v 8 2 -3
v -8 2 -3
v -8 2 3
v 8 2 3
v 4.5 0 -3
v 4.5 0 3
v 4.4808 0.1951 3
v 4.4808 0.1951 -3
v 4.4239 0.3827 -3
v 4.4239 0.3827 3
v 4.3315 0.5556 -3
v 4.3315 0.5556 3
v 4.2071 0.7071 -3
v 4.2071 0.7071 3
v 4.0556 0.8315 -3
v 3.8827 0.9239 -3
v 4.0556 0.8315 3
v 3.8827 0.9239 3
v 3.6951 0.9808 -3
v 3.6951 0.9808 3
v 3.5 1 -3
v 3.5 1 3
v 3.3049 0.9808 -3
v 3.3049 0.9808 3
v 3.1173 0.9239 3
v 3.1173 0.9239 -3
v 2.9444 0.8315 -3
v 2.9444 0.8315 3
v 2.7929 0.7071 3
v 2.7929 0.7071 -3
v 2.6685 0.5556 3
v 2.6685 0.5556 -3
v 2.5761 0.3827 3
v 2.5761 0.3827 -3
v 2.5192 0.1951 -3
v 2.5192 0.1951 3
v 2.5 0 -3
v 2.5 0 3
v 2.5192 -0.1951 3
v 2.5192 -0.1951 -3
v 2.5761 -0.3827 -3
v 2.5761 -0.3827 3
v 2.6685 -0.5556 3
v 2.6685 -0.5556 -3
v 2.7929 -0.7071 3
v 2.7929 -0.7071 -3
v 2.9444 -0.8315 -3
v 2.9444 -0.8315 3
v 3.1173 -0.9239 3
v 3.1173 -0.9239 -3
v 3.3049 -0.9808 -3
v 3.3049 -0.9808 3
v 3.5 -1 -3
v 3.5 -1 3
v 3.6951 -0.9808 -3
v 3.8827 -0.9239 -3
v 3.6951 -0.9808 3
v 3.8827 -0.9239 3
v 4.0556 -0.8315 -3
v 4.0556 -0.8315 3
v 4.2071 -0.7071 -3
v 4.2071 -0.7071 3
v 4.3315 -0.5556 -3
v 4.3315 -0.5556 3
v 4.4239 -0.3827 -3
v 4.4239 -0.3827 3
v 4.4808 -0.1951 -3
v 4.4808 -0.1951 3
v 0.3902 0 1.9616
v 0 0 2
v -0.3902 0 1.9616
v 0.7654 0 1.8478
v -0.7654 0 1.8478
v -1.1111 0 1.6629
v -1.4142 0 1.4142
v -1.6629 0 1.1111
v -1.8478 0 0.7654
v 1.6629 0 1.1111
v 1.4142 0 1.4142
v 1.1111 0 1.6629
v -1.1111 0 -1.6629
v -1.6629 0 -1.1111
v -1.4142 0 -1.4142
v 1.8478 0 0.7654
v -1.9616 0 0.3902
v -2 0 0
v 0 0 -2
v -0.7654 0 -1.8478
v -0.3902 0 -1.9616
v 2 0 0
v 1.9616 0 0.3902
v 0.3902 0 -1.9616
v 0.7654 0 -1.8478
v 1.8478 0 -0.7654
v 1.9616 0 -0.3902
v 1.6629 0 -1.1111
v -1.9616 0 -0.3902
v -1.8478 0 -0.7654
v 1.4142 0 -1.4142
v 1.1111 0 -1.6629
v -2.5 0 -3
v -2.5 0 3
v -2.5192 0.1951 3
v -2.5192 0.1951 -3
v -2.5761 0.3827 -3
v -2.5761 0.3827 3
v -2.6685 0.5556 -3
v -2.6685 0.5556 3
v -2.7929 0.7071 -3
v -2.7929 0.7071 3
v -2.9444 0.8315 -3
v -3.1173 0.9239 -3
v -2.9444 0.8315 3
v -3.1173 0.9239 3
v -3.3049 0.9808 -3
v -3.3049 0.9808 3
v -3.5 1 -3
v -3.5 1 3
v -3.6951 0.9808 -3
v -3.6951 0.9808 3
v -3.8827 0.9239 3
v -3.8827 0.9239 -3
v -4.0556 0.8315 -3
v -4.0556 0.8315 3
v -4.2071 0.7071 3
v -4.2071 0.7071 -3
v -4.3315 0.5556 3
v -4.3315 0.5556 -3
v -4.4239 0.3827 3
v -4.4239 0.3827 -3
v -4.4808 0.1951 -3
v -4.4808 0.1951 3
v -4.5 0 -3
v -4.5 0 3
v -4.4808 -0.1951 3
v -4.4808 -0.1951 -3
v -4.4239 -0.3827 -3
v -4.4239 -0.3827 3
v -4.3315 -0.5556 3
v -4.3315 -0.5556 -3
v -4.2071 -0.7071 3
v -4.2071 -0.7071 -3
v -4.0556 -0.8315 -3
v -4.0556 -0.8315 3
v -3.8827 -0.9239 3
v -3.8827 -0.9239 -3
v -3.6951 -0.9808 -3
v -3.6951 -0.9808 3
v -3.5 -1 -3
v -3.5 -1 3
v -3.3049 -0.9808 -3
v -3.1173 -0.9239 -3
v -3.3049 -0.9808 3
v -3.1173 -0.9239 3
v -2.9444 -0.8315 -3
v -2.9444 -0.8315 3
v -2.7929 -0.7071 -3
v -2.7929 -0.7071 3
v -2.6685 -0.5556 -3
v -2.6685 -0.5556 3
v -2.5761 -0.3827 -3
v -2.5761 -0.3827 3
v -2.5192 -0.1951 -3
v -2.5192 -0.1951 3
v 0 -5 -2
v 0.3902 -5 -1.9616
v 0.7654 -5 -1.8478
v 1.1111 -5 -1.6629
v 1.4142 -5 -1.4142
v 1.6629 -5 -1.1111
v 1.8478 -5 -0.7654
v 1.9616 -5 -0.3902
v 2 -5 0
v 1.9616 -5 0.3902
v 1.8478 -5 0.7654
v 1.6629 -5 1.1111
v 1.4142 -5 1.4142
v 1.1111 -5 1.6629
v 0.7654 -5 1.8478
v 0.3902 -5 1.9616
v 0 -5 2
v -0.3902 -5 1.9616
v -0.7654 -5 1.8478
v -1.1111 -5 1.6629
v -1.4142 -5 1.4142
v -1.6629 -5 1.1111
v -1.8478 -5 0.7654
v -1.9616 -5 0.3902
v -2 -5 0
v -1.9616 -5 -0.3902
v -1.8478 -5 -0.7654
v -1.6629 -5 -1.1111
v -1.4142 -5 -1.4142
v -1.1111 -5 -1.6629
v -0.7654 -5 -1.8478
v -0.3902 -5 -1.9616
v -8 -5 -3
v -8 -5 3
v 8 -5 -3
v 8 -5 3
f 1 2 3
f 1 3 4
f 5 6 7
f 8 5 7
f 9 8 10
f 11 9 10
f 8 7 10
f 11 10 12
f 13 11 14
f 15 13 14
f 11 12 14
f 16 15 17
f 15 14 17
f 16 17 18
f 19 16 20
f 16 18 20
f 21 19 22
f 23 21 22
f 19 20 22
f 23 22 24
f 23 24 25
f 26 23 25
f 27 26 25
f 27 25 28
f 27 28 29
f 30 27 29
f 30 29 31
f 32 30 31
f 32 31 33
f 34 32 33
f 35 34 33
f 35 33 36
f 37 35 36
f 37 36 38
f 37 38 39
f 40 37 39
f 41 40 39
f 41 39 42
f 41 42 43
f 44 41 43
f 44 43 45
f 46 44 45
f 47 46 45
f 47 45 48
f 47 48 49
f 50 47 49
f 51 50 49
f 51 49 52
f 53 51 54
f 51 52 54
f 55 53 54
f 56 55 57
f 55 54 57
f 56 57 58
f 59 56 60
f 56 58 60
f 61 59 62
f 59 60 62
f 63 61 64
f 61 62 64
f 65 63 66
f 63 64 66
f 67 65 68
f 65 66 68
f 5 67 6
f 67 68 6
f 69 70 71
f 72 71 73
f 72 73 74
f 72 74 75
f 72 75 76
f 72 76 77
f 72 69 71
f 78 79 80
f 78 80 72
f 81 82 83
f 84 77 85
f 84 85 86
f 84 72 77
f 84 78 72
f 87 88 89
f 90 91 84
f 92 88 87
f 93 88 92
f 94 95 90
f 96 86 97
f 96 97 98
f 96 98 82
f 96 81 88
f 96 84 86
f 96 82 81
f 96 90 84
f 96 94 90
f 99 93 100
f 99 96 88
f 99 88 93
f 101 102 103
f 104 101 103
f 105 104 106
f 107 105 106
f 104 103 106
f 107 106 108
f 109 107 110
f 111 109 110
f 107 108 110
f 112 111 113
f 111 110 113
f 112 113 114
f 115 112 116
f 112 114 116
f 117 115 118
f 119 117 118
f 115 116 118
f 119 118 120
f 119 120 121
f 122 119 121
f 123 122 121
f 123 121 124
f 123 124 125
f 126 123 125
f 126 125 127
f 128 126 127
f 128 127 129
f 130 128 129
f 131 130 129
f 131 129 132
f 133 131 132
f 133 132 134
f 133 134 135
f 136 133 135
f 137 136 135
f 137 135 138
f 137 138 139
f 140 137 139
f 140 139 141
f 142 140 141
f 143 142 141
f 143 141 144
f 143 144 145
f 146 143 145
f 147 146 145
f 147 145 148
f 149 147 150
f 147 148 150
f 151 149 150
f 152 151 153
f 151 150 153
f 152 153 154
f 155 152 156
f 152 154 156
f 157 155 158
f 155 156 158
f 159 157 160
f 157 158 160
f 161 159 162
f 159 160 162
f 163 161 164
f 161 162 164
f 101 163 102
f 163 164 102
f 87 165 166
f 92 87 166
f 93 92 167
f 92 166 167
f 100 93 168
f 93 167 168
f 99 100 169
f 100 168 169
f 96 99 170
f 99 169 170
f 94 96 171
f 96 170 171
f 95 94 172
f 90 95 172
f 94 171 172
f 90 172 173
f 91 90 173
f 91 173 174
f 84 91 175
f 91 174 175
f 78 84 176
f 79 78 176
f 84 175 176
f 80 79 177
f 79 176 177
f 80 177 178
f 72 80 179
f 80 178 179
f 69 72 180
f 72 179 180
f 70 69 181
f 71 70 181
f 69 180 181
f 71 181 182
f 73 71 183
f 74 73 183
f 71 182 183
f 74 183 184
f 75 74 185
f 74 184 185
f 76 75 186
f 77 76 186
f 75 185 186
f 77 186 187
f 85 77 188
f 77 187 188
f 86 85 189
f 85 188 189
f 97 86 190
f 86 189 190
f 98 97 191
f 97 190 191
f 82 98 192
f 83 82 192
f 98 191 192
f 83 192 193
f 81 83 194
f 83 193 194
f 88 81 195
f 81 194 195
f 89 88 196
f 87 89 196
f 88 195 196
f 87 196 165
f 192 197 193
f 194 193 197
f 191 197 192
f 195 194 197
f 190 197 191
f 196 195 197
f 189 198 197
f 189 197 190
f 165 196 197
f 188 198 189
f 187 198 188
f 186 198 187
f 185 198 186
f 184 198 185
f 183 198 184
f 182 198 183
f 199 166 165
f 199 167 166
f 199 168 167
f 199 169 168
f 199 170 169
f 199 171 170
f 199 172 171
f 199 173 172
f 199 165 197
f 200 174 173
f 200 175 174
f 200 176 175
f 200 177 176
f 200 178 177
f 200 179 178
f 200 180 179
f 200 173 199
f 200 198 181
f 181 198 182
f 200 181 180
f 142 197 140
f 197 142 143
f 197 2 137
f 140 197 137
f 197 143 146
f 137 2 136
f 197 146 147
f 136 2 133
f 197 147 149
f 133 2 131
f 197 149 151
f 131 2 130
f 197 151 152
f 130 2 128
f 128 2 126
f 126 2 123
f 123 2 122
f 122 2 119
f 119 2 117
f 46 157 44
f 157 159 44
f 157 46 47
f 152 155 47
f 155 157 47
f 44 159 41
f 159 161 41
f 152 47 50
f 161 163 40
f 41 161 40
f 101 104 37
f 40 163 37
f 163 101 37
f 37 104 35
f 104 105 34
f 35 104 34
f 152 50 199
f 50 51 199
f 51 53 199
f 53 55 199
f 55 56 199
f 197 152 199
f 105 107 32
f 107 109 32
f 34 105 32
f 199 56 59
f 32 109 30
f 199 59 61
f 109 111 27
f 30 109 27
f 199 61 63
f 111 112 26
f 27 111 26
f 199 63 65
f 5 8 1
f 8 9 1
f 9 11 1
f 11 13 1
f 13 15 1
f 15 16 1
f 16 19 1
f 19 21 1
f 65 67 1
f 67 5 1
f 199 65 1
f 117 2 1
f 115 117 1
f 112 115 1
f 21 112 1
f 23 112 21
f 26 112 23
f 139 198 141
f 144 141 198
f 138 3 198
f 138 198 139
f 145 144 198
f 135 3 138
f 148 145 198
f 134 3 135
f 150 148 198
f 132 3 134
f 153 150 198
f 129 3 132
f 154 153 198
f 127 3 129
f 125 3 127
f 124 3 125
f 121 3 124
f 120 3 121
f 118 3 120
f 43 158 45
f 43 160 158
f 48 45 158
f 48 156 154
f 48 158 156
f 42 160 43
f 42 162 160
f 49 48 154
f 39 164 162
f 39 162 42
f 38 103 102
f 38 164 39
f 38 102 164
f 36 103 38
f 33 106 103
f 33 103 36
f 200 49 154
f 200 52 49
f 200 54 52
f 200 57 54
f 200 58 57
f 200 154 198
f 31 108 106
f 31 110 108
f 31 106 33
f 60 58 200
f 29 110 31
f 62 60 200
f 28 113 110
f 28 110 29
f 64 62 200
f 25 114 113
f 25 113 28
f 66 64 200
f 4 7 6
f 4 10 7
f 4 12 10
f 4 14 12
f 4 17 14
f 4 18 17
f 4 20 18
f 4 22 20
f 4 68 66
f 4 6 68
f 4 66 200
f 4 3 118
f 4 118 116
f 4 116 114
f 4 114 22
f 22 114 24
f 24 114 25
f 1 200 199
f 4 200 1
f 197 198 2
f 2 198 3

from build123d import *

# Parameters (mm, degrees)
SKETCH_1_W          = 16
SKETCH_1_H          = 10
EXTRUDE_1_DEPTH     = 3
SKETCH_2_R          = 2
CUT_EXTRUDE_1_DEPTH = 5
SKETCH_4_R          = 1
CUT_EXTRUDE_2_DEPTH = 10
SKETCH_5_W          = 20.147345776
SKETCH_5_H          = 7.992609138
CUT_EXTRUDE_3_DEPTH = 3


with BuildPart() as part:
    # 스케치1 → 보스-돌출1 (new, symmetric)
    with BuildSketch(Plane.XY):
        Rectangle(SKETCH_1_W, SKETCH_1_H)
    extrude(amount=EXTRUDE_1_DEPTH, both=True)

    # 스케치2 → 컷-돌출1 (cut)
    with BuildSketch(Plane.XZ.offset(5)):
        with Locations(Location((0, 0, 0), (0, 0, 270))):
            Circle(SKETCH_2_R)
    extrude(amount=-CUT_EXTRUDE_1_DEPTH, mode=Mode.SUBTRACT)

    # 스케치4 → 컷-돌출2 (cut)
    with BuildSketch(Plane.XY.offset(3)):
        with Locations((-3.5, 0)):
            Circle(SKETCH_4_R)
        with Locations((3.5, 0)):
            Circle(SKETCH_4_R)
    extrude(amount=-CUT_EXTRUDE_2_DEPTH, mode=Mode.SUBTRACT)

    # 스케치5 → 컷-돌출3 (cut)
    with BuildSketch(Plane(origin=(0, 5, 0), x_dir=(1, 0, 0), z_dir=(0, 1, 0))):
        Rectangle(SKETCH_5_W, SKETCH_5_H)
    extrude(amount=-CUT_EXTRUDE_3_DEPTH, mode=Mode.SUBTRACT)


solid = part.part
